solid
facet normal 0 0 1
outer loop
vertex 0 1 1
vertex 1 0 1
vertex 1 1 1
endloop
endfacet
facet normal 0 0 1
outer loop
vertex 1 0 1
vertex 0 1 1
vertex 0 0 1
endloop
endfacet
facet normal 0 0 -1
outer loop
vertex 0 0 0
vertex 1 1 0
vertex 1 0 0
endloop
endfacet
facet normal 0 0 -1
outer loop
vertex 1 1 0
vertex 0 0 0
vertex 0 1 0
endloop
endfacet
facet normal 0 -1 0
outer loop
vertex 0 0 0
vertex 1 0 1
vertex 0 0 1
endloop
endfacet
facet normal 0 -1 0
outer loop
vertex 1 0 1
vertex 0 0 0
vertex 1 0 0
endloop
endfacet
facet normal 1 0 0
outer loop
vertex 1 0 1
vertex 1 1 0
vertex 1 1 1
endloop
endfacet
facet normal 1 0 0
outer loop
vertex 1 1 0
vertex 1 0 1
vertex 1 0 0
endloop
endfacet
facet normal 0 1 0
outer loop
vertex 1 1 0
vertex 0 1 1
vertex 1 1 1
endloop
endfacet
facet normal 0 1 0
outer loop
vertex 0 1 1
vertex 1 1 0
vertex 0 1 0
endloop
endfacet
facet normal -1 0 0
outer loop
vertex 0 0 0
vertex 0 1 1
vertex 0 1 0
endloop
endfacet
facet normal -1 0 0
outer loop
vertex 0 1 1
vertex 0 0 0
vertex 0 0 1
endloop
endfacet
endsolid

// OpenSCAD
// Unit of length: Unit.INCH
cube(size = 1.0, center = false);
